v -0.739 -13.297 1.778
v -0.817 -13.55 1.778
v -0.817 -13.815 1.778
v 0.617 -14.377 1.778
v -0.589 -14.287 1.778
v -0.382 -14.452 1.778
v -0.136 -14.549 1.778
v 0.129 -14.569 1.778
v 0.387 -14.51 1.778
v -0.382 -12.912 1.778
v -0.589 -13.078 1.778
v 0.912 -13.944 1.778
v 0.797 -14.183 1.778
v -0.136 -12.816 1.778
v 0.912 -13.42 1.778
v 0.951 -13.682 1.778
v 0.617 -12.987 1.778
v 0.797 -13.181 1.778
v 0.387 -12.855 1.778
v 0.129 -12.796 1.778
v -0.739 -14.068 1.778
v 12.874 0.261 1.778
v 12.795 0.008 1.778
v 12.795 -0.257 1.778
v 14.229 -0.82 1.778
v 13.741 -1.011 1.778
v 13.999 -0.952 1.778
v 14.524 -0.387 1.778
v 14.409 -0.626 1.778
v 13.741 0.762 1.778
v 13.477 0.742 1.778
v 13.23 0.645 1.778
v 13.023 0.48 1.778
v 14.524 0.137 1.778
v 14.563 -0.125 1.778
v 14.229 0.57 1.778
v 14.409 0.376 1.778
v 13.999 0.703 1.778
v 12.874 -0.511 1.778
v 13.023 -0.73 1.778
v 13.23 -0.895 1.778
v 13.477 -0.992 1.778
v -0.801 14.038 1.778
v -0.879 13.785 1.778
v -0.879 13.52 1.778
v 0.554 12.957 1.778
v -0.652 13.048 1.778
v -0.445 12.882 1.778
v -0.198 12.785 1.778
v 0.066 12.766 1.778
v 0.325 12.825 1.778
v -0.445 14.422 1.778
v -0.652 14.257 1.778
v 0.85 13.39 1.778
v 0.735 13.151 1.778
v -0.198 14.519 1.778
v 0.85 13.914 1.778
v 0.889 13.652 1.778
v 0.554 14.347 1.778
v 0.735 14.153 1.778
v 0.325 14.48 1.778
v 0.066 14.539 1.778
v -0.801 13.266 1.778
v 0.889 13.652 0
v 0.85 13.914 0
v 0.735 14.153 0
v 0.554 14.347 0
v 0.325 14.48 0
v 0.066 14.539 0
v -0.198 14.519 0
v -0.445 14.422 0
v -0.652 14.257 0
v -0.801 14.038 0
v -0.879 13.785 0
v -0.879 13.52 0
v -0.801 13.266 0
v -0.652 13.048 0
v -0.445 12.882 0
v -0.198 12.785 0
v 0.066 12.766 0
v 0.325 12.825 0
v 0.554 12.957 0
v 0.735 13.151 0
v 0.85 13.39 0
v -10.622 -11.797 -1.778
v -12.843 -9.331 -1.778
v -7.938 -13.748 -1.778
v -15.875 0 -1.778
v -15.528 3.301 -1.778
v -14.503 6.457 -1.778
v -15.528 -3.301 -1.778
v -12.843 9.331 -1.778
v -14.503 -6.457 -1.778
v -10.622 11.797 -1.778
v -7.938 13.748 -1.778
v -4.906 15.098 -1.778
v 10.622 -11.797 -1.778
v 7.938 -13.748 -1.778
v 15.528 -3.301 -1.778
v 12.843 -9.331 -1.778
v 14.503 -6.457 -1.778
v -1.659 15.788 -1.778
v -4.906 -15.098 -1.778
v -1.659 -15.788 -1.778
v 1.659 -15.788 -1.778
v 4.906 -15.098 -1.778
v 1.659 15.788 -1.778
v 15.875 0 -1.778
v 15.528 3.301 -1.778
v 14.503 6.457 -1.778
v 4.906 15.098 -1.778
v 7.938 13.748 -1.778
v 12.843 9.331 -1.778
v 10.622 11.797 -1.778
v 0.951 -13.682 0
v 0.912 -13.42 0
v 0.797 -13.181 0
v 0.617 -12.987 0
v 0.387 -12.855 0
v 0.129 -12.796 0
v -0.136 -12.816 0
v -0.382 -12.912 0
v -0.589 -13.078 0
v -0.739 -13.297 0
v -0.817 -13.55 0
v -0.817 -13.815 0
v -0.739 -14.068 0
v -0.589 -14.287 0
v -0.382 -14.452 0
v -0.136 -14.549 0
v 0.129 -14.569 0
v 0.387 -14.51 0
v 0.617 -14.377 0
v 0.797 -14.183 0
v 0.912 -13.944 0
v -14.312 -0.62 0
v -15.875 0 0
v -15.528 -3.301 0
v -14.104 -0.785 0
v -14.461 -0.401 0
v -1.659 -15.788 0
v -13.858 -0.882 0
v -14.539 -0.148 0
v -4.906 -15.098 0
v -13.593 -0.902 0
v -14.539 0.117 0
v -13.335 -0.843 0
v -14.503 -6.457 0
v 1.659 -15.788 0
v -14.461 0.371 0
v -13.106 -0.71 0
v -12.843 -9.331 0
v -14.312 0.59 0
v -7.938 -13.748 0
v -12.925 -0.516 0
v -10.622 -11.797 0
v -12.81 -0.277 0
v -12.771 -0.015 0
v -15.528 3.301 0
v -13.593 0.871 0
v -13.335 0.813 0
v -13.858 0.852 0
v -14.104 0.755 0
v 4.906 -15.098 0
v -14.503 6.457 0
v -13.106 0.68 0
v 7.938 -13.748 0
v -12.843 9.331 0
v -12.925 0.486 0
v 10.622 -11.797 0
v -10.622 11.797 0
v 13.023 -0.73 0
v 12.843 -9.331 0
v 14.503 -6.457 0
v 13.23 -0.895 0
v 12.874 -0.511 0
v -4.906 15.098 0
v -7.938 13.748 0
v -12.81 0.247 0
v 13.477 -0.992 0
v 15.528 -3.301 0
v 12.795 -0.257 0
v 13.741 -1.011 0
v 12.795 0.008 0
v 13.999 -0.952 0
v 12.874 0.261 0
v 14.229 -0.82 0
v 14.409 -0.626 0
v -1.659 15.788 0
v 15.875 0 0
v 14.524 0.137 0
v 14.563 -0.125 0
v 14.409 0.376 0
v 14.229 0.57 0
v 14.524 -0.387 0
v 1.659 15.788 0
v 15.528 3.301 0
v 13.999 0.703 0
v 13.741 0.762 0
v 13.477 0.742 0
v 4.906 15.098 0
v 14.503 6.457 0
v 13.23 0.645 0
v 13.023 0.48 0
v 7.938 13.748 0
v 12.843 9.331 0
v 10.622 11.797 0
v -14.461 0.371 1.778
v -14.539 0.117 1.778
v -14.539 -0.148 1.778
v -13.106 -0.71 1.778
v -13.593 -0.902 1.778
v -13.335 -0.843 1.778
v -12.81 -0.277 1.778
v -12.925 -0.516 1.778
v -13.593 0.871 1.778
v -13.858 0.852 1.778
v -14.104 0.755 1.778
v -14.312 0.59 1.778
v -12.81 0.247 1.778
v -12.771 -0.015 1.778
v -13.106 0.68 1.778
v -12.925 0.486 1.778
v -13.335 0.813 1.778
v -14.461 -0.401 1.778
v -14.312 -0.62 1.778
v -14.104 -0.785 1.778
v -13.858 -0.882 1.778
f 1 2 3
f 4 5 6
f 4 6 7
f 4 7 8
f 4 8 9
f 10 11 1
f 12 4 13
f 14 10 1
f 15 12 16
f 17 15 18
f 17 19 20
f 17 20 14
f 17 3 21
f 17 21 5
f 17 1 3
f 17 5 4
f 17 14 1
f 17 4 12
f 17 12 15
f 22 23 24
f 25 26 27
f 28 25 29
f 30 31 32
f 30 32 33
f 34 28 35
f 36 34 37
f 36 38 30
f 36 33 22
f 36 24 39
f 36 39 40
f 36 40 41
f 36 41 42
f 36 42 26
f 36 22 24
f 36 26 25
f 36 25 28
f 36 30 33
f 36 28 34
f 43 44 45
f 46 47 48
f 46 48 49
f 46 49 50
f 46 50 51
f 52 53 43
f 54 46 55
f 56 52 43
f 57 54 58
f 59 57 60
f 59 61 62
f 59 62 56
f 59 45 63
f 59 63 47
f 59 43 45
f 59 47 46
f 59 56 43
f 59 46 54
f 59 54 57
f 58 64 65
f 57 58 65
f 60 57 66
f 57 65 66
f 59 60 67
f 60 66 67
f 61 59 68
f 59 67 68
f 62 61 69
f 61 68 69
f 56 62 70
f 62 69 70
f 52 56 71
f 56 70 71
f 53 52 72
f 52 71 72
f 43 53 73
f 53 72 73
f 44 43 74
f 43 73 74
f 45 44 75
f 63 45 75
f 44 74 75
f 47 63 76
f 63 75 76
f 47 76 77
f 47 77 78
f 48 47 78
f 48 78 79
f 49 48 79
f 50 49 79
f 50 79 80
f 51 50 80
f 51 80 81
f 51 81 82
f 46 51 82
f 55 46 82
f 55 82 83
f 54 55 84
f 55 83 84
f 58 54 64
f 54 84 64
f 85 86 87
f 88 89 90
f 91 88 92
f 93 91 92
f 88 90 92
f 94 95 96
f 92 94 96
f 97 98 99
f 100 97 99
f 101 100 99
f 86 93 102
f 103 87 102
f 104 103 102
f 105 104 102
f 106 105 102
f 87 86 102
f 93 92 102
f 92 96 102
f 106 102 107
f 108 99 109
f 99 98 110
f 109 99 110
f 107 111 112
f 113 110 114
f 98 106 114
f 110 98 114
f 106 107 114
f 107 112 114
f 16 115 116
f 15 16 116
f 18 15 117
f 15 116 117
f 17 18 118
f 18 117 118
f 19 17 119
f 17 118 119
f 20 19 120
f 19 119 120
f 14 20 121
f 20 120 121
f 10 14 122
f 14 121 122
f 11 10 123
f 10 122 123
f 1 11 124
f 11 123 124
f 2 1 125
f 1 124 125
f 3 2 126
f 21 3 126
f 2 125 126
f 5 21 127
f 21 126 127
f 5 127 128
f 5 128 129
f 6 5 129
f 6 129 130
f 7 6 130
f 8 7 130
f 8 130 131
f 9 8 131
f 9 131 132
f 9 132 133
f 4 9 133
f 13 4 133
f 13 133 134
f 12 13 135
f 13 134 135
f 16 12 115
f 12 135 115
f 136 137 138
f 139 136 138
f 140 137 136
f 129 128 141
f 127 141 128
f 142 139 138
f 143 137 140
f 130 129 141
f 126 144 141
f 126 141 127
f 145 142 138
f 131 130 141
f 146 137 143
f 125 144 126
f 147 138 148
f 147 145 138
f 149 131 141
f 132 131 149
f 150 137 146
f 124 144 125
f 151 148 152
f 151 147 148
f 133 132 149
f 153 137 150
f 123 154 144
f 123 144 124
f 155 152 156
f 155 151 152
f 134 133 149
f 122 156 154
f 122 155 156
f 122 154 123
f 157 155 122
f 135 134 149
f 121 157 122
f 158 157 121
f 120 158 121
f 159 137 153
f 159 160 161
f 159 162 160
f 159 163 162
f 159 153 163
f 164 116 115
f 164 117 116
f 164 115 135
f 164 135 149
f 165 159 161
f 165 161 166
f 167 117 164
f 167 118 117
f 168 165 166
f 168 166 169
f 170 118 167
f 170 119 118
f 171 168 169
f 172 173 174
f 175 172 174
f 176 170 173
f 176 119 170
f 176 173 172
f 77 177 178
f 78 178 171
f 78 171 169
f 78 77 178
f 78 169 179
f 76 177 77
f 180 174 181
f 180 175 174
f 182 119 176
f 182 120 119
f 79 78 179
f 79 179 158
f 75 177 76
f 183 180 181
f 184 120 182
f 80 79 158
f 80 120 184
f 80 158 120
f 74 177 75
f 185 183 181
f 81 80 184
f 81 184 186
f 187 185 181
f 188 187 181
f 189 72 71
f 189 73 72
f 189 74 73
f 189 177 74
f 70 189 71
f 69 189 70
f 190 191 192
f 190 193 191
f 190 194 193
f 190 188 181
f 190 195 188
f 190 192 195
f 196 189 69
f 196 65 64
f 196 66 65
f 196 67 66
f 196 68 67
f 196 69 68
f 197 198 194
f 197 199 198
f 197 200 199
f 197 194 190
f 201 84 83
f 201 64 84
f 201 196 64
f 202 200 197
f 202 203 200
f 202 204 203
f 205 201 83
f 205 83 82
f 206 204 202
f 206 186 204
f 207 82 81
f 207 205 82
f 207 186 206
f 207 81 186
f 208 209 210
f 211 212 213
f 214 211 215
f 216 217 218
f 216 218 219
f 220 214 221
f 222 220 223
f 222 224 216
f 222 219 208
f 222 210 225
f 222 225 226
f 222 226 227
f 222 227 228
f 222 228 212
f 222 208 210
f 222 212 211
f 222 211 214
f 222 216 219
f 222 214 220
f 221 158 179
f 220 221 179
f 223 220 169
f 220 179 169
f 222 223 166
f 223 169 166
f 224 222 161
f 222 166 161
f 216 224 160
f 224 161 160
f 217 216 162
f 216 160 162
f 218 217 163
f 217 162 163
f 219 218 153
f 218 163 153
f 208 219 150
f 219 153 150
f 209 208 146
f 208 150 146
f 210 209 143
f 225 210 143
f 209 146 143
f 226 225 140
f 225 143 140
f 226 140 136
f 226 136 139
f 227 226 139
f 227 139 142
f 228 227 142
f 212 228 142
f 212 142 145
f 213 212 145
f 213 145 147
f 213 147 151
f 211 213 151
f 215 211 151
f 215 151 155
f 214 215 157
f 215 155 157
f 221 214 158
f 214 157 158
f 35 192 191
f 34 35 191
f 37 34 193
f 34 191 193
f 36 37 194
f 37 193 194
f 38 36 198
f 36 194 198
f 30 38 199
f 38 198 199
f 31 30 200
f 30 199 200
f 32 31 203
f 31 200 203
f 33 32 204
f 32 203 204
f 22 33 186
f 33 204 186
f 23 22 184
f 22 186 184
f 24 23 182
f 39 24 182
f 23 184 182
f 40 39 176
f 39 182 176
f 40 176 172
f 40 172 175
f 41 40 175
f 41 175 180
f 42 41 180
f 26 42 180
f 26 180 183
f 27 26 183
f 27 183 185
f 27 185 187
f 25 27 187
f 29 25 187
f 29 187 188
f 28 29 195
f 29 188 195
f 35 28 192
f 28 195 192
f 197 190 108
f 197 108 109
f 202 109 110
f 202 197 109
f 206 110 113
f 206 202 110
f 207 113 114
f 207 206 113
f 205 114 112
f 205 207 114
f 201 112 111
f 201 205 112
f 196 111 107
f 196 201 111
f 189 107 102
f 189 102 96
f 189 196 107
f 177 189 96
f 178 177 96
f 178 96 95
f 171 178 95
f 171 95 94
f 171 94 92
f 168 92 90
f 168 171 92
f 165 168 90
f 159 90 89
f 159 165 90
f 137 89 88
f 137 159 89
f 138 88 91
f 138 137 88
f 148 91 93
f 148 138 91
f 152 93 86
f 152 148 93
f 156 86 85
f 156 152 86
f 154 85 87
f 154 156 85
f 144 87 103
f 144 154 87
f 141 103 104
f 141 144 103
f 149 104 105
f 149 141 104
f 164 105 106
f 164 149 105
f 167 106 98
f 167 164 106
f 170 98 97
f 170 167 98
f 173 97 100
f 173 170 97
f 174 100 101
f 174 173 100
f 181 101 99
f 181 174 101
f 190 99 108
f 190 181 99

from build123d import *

# Parameters (mm, degrees)
F0_R     = 15.875
F1_DEPTH = 1.778
F3_R     = 0.889
F4_DEPTH = 1.778


with BuildPart() as f1:
    # F0 (on Top) → F1 (new body)
    with BuildSketch(Plane.XY):
        Circle(F0_R)
    extrude(amount=-F1_DEPTH)

    # F3 (on face) → F4 (join)
    with BuildSketch(Plane.XY):
        with Locations((0, 13.652203)):
            Circle(F3_R)
        with Locations((-13.659894, -0.015021)):
            Circle(F3_R)
        with Locations((0.062219, -13.682245)):
            Circle(F3_R)
        with Locations((13.674476, -0.124876)):
            Circle(F3_R)
    extrude(amount=F4_DEPTH)


solid = f1.part
